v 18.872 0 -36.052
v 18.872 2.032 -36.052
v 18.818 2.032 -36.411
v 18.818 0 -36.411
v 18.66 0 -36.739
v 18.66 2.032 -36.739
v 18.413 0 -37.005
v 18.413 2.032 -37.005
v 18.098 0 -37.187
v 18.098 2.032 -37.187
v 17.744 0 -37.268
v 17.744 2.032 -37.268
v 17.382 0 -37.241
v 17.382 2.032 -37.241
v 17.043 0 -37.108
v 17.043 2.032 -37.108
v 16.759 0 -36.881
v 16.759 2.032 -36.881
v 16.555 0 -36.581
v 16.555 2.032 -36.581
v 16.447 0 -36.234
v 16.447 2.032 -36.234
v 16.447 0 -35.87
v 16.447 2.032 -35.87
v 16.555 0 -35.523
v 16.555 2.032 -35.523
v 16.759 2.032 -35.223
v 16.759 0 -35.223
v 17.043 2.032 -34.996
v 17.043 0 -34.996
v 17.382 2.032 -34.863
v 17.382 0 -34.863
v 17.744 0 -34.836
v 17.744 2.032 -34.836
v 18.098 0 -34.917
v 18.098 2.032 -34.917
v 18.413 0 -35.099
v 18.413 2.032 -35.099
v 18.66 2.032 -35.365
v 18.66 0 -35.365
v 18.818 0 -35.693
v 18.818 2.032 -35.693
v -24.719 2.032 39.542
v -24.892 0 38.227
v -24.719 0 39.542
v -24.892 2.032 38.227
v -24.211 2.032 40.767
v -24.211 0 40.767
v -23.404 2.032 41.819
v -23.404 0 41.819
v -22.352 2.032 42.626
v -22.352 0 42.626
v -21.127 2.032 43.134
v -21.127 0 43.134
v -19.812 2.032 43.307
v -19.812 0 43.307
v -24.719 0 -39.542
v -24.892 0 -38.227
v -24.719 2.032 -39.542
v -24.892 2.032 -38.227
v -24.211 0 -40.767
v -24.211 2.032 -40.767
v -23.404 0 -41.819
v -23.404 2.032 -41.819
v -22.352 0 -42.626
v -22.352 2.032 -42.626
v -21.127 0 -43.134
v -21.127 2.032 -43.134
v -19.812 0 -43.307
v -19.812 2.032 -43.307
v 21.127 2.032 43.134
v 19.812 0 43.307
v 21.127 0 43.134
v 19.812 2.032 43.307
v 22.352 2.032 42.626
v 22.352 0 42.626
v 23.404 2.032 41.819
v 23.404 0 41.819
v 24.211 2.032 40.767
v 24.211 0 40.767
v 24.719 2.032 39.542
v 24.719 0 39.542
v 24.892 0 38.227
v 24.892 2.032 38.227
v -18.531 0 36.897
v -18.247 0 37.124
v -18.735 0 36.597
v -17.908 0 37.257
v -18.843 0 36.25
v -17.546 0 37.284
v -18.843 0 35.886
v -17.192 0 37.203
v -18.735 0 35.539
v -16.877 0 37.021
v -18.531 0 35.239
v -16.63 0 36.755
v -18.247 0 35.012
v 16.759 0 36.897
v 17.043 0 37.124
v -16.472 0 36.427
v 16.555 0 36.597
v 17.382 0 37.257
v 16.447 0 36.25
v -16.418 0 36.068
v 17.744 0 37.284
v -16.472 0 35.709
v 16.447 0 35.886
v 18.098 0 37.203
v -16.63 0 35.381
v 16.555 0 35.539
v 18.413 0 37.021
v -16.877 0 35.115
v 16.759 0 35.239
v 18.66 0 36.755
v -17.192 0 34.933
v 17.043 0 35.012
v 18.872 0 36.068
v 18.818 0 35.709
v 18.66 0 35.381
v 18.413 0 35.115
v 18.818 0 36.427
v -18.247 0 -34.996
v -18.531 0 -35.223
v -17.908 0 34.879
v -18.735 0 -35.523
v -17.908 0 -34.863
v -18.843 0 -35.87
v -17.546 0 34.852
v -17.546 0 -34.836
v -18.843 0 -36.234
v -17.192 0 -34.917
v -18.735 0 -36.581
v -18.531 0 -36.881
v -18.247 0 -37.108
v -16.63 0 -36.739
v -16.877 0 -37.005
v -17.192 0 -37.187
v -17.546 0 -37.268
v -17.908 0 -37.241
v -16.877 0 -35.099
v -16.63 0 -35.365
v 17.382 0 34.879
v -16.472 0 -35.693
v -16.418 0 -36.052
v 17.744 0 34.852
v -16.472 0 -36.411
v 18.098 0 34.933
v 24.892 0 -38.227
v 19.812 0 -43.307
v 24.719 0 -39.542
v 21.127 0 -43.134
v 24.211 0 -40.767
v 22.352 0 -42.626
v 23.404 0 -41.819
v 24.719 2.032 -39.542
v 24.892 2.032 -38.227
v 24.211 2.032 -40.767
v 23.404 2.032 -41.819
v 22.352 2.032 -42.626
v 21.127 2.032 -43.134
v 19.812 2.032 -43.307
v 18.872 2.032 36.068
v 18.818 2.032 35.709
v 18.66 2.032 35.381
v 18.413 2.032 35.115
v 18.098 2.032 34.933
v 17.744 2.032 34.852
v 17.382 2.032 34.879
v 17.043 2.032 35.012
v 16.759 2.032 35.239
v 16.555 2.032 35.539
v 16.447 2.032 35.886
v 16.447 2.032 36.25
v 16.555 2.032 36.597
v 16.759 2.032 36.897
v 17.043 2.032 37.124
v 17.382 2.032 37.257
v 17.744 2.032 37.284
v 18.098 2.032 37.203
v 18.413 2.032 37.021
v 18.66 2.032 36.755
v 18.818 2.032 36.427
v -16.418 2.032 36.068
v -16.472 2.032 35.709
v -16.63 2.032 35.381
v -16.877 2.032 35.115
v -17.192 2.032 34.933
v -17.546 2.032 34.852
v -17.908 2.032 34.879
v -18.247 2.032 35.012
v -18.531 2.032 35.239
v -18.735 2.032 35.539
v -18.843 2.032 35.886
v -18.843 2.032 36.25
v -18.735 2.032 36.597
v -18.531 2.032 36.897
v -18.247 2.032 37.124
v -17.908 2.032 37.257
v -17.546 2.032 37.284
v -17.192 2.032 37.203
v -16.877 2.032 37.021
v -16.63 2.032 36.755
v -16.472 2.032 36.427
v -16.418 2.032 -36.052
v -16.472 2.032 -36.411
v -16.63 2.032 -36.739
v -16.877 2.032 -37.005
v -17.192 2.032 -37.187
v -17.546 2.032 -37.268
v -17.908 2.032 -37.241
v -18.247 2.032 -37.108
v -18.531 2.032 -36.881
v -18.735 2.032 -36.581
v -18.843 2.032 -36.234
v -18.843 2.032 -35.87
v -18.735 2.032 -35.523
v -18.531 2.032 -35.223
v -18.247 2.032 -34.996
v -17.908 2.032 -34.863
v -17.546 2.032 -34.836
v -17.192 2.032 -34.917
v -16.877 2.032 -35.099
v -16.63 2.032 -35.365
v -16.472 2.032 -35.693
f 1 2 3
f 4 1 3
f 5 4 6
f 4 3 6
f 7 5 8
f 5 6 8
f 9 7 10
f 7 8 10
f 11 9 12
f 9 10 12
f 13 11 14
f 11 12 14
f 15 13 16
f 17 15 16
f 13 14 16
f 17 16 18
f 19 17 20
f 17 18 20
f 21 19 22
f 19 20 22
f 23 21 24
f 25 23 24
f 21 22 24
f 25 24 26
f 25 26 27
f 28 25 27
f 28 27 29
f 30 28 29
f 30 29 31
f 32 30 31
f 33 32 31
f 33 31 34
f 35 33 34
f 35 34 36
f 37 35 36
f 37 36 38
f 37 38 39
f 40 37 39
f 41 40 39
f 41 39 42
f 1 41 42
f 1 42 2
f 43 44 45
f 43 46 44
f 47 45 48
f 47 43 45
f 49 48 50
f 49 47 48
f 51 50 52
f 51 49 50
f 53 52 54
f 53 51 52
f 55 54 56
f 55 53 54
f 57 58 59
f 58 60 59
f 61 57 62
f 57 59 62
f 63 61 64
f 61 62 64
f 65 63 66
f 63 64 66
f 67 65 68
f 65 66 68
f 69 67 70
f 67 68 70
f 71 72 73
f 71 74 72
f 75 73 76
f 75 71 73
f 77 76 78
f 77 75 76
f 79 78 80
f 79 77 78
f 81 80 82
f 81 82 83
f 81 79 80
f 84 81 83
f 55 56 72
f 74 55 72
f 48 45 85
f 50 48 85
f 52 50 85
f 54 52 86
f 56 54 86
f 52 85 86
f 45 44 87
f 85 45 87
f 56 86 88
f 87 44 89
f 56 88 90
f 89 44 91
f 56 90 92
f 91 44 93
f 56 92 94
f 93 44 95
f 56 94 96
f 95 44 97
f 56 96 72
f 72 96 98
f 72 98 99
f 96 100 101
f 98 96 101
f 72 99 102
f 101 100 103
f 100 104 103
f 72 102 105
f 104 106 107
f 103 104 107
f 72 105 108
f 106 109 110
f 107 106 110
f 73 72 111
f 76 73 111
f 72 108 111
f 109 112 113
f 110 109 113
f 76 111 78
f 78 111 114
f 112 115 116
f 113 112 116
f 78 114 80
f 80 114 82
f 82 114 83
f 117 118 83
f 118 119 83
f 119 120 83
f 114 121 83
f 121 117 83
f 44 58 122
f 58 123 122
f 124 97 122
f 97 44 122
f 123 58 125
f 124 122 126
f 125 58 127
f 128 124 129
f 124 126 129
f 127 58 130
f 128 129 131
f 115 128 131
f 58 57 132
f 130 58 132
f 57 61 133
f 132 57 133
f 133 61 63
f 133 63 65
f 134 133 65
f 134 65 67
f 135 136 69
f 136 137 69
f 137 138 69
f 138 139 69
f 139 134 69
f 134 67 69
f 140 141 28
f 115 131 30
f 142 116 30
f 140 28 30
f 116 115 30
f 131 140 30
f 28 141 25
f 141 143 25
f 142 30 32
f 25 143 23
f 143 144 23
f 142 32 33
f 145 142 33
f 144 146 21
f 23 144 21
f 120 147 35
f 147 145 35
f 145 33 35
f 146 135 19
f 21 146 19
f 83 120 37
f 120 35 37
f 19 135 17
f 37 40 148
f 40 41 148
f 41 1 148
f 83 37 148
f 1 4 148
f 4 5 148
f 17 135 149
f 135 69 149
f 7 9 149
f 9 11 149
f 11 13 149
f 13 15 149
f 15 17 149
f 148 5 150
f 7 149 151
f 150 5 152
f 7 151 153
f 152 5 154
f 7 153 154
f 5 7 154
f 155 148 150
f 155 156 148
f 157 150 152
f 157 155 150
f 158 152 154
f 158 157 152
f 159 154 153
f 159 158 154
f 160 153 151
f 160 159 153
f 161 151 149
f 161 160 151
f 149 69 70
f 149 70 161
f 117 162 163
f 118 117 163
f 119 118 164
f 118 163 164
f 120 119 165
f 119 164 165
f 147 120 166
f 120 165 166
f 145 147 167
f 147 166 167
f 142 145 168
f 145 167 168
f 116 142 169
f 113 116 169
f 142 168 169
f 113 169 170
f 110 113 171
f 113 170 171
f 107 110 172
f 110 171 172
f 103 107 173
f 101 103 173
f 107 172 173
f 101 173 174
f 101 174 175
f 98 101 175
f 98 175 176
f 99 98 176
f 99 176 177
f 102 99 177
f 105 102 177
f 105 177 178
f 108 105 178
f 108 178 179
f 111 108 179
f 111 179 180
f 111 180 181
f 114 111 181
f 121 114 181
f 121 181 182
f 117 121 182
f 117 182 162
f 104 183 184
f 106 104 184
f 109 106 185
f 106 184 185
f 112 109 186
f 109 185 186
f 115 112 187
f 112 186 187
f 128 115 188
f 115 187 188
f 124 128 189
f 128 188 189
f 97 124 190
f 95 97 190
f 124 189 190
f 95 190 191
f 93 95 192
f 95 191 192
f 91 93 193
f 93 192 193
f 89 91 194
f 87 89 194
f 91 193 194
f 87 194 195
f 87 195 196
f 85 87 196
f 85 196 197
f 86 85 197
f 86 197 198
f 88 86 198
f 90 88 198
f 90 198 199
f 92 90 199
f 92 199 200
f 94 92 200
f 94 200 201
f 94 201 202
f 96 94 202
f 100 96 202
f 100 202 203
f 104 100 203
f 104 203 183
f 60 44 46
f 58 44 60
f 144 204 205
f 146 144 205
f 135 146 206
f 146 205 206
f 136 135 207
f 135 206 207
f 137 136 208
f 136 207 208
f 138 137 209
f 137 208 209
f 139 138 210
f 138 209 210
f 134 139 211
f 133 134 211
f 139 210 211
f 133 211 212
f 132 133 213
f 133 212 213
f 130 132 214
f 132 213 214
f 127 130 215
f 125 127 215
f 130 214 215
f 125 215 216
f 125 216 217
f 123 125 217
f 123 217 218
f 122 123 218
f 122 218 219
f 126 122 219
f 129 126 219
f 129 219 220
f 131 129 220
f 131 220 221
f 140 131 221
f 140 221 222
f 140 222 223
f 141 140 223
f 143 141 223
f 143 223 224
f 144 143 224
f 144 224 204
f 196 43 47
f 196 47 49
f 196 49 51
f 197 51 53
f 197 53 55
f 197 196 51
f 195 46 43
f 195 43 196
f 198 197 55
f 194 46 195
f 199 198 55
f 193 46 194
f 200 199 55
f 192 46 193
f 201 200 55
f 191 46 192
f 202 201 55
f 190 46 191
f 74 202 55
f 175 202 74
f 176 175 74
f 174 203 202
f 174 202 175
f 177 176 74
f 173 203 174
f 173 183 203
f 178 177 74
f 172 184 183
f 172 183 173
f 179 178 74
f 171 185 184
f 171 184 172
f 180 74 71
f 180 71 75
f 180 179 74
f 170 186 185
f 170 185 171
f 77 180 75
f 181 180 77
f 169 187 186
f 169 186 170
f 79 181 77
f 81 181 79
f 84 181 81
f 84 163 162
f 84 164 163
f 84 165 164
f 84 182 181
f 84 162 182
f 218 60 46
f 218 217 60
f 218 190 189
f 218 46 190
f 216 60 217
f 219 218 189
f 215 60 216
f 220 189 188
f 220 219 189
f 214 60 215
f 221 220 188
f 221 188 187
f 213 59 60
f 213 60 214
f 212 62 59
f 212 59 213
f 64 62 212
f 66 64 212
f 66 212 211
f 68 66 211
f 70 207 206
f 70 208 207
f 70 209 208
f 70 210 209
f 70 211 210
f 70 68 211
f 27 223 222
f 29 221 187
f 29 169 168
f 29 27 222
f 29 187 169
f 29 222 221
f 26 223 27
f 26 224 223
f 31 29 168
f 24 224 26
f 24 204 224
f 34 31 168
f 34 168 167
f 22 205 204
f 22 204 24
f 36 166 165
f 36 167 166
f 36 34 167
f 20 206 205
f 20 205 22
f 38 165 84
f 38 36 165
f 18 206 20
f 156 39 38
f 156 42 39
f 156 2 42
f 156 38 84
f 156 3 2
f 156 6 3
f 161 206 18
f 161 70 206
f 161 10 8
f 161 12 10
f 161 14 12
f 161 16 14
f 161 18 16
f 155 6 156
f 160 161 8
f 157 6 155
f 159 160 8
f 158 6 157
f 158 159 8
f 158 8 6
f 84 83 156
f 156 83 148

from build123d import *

# Parameters (mm, degrees)
SKETCH1_W             = 49.784
SKETCH1_H             = 86.614
BOSS_EXTRUDE1_DEPTH   = 2.032
FILLET1_R             = 5.08
F_2_CLEARANCE_HOLE1_D = 2.4384


with BuildPart() as part:
    # Sketch1 → Boss-Extrude1 (new body)
    with BuildSketch(Plane(origin=(0, 0, 0), x_dir=(1, 0, 0), z_dir=(0, 1, 0))):
        Rectangle(SKETCH1_W, SKETCH1_H)
    extrude(amount=BOSS_EXTRUDE1_DEPTH)

    # Fillet1
    fillet1_edges = [part.edges().sort_by_distance(p)[0] for p in [
        (-24.892, 1.016, -43.307),
        (24.892, 1.016, -43.307),
        (24.892, 1.016, 43.307),
        (-24.892, 1.016, 43.307),
    ]]
    fillet(fillet1_edges, radius=FILLET1_R)

    # #2 Clearance Hole1 (through all)
    with Locations(Plane(origin=(0, 0, 0), x_dir=(-1, 0, 0), z_dir=(0, -1, 0))):
        with Locations((-17.653, 36.051955783), (17.636955783, 36.051955783), (-17.653, -36.068), (17.636955783, -36.068)):
            Hole(F_2_CLEARANCE_HOLE1_D / 2)


solid = part.part
